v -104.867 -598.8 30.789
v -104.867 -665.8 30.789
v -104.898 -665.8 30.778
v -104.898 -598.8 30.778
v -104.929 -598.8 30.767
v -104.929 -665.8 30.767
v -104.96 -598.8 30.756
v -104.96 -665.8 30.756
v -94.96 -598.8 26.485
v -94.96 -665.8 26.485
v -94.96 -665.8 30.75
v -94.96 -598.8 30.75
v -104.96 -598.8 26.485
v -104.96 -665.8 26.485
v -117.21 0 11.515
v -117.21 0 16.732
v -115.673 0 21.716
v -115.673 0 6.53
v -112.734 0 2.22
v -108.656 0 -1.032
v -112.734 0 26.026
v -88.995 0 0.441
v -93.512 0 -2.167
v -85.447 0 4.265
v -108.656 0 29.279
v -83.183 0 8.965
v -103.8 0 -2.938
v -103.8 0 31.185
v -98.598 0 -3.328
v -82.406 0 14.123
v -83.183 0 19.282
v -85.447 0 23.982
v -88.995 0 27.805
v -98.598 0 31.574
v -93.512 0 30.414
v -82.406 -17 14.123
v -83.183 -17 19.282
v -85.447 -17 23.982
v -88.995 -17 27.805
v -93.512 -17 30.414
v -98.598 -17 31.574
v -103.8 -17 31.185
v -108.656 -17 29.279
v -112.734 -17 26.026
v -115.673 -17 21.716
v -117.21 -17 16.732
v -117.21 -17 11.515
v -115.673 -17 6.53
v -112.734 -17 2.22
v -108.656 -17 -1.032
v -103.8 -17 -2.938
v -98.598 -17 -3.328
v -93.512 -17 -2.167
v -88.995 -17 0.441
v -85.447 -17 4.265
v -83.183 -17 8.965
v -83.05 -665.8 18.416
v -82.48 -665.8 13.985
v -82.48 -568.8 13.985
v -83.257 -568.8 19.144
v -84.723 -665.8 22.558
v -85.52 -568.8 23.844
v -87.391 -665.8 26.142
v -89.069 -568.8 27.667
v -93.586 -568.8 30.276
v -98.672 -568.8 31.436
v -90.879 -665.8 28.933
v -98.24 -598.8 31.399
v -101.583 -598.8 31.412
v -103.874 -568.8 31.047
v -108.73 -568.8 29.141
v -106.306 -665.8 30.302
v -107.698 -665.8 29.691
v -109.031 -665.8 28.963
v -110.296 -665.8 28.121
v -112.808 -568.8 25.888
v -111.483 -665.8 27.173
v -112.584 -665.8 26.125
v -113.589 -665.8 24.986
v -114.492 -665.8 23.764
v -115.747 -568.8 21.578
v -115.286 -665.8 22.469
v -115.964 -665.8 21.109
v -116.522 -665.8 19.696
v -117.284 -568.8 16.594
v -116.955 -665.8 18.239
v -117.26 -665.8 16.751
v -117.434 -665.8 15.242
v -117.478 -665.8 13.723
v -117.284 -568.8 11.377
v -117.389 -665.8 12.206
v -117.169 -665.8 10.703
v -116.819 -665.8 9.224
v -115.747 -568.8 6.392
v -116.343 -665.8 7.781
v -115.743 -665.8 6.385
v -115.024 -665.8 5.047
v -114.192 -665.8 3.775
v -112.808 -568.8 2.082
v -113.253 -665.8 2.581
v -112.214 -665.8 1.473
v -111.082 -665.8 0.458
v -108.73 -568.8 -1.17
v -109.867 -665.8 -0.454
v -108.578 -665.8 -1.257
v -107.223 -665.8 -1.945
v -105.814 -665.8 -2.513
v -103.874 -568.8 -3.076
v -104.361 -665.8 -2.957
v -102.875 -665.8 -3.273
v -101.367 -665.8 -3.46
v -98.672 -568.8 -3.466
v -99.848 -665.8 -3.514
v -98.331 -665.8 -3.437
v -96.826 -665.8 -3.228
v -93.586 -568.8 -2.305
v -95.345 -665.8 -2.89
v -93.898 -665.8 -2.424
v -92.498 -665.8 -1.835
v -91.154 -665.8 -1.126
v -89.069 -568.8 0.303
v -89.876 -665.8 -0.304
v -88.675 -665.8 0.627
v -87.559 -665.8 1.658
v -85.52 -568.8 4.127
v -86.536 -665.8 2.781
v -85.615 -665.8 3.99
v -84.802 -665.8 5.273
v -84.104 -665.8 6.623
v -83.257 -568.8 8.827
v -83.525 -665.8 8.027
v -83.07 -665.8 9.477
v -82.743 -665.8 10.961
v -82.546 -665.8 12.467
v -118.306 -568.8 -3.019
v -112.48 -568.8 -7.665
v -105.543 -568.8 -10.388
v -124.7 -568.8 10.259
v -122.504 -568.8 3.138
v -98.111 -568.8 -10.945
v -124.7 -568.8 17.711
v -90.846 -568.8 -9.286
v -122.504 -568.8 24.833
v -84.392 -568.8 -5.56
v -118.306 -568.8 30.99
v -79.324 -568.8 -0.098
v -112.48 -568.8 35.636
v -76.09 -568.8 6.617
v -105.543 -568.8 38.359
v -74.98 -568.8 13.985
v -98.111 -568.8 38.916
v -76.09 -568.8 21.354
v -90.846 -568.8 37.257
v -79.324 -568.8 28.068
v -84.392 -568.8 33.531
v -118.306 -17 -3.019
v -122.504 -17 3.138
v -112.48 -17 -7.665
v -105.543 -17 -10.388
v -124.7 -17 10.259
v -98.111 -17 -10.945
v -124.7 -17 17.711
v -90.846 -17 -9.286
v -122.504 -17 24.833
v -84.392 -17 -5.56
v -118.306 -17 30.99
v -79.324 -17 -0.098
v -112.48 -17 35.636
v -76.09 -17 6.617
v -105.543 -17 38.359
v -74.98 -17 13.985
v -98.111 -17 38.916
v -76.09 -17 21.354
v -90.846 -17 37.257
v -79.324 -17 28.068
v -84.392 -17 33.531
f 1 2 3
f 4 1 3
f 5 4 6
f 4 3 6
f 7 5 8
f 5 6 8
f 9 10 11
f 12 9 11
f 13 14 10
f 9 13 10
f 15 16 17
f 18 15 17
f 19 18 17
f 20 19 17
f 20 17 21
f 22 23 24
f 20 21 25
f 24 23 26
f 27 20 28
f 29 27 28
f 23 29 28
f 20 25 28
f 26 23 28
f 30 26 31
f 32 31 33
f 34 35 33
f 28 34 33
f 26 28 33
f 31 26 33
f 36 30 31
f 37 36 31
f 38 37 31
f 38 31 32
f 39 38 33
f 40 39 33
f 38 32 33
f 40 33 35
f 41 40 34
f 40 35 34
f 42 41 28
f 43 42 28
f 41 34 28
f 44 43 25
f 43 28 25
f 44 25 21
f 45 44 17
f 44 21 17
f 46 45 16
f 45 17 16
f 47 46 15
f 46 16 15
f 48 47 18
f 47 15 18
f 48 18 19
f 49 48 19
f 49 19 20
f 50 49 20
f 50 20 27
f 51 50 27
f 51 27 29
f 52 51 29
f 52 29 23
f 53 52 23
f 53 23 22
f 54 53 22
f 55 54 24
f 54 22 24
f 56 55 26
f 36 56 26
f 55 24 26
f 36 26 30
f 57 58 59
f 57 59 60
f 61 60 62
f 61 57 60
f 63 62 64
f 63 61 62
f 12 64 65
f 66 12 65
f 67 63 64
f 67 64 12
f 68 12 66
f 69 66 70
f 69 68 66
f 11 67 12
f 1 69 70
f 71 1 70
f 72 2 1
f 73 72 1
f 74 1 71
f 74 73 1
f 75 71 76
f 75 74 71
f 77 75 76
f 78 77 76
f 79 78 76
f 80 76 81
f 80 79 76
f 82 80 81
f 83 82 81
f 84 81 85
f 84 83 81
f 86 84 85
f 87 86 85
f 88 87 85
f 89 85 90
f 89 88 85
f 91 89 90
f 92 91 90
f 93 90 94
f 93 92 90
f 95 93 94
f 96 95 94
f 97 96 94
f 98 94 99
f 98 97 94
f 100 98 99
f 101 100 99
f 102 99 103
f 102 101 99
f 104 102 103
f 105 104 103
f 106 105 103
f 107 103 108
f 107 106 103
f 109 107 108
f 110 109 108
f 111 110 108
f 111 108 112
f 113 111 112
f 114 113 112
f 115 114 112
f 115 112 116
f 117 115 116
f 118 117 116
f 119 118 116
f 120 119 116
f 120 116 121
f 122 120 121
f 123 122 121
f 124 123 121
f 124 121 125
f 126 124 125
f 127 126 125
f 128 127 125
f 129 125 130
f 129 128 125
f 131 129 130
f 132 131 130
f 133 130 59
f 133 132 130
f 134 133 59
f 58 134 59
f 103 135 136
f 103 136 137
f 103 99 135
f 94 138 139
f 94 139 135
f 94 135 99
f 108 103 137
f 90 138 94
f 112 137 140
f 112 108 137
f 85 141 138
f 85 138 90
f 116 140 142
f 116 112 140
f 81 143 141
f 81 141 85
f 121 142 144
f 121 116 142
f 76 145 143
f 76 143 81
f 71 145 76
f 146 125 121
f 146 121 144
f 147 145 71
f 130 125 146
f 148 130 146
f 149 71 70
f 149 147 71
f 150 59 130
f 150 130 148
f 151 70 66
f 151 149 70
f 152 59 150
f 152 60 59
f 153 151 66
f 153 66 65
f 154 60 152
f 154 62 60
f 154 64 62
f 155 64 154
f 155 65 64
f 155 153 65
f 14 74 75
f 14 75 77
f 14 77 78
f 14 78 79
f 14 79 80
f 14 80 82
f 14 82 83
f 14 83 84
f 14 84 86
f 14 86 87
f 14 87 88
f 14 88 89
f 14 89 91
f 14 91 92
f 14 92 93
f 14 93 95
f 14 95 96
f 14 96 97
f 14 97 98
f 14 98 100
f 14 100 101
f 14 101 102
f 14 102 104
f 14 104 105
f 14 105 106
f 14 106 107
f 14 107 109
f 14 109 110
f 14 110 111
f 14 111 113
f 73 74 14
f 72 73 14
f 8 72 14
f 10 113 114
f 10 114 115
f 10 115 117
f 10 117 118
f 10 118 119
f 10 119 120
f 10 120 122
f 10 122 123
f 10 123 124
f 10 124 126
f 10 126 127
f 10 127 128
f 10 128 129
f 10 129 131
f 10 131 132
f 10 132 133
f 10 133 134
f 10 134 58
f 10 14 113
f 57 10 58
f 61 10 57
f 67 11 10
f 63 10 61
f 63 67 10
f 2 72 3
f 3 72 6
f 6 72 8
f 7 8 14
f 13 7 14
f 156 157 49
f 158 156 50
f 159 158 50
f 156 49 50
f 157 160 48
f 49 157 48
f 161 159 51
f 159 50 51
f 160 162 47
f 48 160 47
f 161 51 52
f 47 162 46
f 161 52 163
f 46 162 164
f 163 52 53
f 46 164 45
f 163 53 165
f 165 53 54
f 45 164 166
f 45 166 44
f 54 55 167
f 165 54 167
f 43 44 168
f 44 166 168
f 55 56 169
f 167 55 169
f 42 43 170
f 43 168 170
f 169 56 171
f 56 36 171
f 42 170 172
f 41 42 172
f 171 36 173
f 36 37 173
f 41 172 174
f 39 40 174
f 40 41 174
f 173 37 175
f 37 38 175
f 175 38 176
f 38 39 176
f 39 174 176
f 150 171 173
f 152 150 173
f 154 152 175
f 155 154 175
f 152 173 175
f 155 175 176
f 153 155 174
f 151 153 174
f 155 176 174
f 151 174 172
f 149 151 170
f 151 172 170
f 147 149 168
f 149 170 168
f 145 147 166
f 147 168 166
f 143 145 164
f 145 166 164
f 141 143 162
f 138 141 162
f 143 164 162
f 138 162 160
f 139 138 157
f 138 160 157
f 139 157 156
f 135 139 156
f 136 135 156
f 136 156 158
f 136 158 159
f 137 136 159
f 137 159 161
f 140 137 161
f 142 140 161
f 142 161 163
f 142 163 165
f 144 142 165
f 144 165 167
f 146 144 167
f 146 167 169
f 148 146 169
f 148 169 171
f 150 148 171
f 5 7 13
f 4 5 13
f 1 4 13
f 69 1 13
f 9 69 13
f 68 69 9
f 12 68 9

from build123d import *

# Parameters (mm, degrees)
F0_R     = 25
F1_DEPTH = 665.8
F2_R     = 25
F2_R_2   = 17.5
F3_DEPTH = 97
F4_R     = 25
F4_R_2   = 17.5
F5_DEPTH = 17
F7_DEPTH = 67


with BuildPart() as f1:
    # F0 (on Front) → F1 (new body)
    with BuildSketch(Plane.XZ):
        with Locations((-99.979594, 13.985418)):
            Circle(F0_R)
    extrude(amount=F1_DEPTH)

    # F2 (on face) → F3 (cut)
    with BuildSketch(Plane.XZ.offset(665.8)):
        with Locations((-99.979594, 13.985418)):
            Circle(F2_R)
        with Locations((-99.979594, 13.985418)):
            Circle(F2_R_2, mode=Mode.SUBTRACT)
    extrude(amount=-F3_DEPTH, mode=Mode.SUBTRACT)

    # F4 (on face) → F5 (cut)
    with BuildSketch(Plane.XZ):
        with Locations((-99.979594, 13.985418)):
            Circle(F4_R)
        with Locations((-99.905901, 14.123433)):
            Circle(F4_R_2, mode=Mode.SUBTRACT)
    extrude(amount=F5_DEPTH, mode=Mode.SUBTRACT)

    # F6 (on face) → F7 (cut)
    with BuildSketch(Plane.XZ.offset(665.8)):
        with BuildLine():
            Line((-104.960215, 30.756418), (-104.960215, 26.485418))
            Line((-104.960215, 26.485418), (-94.960215, 26.485418))
            Line((-94.960215, 26.485418), (-94.960215, 30.750138))
            ThreePointArc((-94.960215, 30.750138), (-99.910954, 31.485283), (-104.867307, 30.788997))
            ThreePointArc((-104.867307, 30.788997), (-104.913788, 30.772784), (-104.960215, 30.756418))
        make_face()
    extrude(amount=-F7_DEPTH, mode=Mode.SUBTRACT)


solid = f1.part
